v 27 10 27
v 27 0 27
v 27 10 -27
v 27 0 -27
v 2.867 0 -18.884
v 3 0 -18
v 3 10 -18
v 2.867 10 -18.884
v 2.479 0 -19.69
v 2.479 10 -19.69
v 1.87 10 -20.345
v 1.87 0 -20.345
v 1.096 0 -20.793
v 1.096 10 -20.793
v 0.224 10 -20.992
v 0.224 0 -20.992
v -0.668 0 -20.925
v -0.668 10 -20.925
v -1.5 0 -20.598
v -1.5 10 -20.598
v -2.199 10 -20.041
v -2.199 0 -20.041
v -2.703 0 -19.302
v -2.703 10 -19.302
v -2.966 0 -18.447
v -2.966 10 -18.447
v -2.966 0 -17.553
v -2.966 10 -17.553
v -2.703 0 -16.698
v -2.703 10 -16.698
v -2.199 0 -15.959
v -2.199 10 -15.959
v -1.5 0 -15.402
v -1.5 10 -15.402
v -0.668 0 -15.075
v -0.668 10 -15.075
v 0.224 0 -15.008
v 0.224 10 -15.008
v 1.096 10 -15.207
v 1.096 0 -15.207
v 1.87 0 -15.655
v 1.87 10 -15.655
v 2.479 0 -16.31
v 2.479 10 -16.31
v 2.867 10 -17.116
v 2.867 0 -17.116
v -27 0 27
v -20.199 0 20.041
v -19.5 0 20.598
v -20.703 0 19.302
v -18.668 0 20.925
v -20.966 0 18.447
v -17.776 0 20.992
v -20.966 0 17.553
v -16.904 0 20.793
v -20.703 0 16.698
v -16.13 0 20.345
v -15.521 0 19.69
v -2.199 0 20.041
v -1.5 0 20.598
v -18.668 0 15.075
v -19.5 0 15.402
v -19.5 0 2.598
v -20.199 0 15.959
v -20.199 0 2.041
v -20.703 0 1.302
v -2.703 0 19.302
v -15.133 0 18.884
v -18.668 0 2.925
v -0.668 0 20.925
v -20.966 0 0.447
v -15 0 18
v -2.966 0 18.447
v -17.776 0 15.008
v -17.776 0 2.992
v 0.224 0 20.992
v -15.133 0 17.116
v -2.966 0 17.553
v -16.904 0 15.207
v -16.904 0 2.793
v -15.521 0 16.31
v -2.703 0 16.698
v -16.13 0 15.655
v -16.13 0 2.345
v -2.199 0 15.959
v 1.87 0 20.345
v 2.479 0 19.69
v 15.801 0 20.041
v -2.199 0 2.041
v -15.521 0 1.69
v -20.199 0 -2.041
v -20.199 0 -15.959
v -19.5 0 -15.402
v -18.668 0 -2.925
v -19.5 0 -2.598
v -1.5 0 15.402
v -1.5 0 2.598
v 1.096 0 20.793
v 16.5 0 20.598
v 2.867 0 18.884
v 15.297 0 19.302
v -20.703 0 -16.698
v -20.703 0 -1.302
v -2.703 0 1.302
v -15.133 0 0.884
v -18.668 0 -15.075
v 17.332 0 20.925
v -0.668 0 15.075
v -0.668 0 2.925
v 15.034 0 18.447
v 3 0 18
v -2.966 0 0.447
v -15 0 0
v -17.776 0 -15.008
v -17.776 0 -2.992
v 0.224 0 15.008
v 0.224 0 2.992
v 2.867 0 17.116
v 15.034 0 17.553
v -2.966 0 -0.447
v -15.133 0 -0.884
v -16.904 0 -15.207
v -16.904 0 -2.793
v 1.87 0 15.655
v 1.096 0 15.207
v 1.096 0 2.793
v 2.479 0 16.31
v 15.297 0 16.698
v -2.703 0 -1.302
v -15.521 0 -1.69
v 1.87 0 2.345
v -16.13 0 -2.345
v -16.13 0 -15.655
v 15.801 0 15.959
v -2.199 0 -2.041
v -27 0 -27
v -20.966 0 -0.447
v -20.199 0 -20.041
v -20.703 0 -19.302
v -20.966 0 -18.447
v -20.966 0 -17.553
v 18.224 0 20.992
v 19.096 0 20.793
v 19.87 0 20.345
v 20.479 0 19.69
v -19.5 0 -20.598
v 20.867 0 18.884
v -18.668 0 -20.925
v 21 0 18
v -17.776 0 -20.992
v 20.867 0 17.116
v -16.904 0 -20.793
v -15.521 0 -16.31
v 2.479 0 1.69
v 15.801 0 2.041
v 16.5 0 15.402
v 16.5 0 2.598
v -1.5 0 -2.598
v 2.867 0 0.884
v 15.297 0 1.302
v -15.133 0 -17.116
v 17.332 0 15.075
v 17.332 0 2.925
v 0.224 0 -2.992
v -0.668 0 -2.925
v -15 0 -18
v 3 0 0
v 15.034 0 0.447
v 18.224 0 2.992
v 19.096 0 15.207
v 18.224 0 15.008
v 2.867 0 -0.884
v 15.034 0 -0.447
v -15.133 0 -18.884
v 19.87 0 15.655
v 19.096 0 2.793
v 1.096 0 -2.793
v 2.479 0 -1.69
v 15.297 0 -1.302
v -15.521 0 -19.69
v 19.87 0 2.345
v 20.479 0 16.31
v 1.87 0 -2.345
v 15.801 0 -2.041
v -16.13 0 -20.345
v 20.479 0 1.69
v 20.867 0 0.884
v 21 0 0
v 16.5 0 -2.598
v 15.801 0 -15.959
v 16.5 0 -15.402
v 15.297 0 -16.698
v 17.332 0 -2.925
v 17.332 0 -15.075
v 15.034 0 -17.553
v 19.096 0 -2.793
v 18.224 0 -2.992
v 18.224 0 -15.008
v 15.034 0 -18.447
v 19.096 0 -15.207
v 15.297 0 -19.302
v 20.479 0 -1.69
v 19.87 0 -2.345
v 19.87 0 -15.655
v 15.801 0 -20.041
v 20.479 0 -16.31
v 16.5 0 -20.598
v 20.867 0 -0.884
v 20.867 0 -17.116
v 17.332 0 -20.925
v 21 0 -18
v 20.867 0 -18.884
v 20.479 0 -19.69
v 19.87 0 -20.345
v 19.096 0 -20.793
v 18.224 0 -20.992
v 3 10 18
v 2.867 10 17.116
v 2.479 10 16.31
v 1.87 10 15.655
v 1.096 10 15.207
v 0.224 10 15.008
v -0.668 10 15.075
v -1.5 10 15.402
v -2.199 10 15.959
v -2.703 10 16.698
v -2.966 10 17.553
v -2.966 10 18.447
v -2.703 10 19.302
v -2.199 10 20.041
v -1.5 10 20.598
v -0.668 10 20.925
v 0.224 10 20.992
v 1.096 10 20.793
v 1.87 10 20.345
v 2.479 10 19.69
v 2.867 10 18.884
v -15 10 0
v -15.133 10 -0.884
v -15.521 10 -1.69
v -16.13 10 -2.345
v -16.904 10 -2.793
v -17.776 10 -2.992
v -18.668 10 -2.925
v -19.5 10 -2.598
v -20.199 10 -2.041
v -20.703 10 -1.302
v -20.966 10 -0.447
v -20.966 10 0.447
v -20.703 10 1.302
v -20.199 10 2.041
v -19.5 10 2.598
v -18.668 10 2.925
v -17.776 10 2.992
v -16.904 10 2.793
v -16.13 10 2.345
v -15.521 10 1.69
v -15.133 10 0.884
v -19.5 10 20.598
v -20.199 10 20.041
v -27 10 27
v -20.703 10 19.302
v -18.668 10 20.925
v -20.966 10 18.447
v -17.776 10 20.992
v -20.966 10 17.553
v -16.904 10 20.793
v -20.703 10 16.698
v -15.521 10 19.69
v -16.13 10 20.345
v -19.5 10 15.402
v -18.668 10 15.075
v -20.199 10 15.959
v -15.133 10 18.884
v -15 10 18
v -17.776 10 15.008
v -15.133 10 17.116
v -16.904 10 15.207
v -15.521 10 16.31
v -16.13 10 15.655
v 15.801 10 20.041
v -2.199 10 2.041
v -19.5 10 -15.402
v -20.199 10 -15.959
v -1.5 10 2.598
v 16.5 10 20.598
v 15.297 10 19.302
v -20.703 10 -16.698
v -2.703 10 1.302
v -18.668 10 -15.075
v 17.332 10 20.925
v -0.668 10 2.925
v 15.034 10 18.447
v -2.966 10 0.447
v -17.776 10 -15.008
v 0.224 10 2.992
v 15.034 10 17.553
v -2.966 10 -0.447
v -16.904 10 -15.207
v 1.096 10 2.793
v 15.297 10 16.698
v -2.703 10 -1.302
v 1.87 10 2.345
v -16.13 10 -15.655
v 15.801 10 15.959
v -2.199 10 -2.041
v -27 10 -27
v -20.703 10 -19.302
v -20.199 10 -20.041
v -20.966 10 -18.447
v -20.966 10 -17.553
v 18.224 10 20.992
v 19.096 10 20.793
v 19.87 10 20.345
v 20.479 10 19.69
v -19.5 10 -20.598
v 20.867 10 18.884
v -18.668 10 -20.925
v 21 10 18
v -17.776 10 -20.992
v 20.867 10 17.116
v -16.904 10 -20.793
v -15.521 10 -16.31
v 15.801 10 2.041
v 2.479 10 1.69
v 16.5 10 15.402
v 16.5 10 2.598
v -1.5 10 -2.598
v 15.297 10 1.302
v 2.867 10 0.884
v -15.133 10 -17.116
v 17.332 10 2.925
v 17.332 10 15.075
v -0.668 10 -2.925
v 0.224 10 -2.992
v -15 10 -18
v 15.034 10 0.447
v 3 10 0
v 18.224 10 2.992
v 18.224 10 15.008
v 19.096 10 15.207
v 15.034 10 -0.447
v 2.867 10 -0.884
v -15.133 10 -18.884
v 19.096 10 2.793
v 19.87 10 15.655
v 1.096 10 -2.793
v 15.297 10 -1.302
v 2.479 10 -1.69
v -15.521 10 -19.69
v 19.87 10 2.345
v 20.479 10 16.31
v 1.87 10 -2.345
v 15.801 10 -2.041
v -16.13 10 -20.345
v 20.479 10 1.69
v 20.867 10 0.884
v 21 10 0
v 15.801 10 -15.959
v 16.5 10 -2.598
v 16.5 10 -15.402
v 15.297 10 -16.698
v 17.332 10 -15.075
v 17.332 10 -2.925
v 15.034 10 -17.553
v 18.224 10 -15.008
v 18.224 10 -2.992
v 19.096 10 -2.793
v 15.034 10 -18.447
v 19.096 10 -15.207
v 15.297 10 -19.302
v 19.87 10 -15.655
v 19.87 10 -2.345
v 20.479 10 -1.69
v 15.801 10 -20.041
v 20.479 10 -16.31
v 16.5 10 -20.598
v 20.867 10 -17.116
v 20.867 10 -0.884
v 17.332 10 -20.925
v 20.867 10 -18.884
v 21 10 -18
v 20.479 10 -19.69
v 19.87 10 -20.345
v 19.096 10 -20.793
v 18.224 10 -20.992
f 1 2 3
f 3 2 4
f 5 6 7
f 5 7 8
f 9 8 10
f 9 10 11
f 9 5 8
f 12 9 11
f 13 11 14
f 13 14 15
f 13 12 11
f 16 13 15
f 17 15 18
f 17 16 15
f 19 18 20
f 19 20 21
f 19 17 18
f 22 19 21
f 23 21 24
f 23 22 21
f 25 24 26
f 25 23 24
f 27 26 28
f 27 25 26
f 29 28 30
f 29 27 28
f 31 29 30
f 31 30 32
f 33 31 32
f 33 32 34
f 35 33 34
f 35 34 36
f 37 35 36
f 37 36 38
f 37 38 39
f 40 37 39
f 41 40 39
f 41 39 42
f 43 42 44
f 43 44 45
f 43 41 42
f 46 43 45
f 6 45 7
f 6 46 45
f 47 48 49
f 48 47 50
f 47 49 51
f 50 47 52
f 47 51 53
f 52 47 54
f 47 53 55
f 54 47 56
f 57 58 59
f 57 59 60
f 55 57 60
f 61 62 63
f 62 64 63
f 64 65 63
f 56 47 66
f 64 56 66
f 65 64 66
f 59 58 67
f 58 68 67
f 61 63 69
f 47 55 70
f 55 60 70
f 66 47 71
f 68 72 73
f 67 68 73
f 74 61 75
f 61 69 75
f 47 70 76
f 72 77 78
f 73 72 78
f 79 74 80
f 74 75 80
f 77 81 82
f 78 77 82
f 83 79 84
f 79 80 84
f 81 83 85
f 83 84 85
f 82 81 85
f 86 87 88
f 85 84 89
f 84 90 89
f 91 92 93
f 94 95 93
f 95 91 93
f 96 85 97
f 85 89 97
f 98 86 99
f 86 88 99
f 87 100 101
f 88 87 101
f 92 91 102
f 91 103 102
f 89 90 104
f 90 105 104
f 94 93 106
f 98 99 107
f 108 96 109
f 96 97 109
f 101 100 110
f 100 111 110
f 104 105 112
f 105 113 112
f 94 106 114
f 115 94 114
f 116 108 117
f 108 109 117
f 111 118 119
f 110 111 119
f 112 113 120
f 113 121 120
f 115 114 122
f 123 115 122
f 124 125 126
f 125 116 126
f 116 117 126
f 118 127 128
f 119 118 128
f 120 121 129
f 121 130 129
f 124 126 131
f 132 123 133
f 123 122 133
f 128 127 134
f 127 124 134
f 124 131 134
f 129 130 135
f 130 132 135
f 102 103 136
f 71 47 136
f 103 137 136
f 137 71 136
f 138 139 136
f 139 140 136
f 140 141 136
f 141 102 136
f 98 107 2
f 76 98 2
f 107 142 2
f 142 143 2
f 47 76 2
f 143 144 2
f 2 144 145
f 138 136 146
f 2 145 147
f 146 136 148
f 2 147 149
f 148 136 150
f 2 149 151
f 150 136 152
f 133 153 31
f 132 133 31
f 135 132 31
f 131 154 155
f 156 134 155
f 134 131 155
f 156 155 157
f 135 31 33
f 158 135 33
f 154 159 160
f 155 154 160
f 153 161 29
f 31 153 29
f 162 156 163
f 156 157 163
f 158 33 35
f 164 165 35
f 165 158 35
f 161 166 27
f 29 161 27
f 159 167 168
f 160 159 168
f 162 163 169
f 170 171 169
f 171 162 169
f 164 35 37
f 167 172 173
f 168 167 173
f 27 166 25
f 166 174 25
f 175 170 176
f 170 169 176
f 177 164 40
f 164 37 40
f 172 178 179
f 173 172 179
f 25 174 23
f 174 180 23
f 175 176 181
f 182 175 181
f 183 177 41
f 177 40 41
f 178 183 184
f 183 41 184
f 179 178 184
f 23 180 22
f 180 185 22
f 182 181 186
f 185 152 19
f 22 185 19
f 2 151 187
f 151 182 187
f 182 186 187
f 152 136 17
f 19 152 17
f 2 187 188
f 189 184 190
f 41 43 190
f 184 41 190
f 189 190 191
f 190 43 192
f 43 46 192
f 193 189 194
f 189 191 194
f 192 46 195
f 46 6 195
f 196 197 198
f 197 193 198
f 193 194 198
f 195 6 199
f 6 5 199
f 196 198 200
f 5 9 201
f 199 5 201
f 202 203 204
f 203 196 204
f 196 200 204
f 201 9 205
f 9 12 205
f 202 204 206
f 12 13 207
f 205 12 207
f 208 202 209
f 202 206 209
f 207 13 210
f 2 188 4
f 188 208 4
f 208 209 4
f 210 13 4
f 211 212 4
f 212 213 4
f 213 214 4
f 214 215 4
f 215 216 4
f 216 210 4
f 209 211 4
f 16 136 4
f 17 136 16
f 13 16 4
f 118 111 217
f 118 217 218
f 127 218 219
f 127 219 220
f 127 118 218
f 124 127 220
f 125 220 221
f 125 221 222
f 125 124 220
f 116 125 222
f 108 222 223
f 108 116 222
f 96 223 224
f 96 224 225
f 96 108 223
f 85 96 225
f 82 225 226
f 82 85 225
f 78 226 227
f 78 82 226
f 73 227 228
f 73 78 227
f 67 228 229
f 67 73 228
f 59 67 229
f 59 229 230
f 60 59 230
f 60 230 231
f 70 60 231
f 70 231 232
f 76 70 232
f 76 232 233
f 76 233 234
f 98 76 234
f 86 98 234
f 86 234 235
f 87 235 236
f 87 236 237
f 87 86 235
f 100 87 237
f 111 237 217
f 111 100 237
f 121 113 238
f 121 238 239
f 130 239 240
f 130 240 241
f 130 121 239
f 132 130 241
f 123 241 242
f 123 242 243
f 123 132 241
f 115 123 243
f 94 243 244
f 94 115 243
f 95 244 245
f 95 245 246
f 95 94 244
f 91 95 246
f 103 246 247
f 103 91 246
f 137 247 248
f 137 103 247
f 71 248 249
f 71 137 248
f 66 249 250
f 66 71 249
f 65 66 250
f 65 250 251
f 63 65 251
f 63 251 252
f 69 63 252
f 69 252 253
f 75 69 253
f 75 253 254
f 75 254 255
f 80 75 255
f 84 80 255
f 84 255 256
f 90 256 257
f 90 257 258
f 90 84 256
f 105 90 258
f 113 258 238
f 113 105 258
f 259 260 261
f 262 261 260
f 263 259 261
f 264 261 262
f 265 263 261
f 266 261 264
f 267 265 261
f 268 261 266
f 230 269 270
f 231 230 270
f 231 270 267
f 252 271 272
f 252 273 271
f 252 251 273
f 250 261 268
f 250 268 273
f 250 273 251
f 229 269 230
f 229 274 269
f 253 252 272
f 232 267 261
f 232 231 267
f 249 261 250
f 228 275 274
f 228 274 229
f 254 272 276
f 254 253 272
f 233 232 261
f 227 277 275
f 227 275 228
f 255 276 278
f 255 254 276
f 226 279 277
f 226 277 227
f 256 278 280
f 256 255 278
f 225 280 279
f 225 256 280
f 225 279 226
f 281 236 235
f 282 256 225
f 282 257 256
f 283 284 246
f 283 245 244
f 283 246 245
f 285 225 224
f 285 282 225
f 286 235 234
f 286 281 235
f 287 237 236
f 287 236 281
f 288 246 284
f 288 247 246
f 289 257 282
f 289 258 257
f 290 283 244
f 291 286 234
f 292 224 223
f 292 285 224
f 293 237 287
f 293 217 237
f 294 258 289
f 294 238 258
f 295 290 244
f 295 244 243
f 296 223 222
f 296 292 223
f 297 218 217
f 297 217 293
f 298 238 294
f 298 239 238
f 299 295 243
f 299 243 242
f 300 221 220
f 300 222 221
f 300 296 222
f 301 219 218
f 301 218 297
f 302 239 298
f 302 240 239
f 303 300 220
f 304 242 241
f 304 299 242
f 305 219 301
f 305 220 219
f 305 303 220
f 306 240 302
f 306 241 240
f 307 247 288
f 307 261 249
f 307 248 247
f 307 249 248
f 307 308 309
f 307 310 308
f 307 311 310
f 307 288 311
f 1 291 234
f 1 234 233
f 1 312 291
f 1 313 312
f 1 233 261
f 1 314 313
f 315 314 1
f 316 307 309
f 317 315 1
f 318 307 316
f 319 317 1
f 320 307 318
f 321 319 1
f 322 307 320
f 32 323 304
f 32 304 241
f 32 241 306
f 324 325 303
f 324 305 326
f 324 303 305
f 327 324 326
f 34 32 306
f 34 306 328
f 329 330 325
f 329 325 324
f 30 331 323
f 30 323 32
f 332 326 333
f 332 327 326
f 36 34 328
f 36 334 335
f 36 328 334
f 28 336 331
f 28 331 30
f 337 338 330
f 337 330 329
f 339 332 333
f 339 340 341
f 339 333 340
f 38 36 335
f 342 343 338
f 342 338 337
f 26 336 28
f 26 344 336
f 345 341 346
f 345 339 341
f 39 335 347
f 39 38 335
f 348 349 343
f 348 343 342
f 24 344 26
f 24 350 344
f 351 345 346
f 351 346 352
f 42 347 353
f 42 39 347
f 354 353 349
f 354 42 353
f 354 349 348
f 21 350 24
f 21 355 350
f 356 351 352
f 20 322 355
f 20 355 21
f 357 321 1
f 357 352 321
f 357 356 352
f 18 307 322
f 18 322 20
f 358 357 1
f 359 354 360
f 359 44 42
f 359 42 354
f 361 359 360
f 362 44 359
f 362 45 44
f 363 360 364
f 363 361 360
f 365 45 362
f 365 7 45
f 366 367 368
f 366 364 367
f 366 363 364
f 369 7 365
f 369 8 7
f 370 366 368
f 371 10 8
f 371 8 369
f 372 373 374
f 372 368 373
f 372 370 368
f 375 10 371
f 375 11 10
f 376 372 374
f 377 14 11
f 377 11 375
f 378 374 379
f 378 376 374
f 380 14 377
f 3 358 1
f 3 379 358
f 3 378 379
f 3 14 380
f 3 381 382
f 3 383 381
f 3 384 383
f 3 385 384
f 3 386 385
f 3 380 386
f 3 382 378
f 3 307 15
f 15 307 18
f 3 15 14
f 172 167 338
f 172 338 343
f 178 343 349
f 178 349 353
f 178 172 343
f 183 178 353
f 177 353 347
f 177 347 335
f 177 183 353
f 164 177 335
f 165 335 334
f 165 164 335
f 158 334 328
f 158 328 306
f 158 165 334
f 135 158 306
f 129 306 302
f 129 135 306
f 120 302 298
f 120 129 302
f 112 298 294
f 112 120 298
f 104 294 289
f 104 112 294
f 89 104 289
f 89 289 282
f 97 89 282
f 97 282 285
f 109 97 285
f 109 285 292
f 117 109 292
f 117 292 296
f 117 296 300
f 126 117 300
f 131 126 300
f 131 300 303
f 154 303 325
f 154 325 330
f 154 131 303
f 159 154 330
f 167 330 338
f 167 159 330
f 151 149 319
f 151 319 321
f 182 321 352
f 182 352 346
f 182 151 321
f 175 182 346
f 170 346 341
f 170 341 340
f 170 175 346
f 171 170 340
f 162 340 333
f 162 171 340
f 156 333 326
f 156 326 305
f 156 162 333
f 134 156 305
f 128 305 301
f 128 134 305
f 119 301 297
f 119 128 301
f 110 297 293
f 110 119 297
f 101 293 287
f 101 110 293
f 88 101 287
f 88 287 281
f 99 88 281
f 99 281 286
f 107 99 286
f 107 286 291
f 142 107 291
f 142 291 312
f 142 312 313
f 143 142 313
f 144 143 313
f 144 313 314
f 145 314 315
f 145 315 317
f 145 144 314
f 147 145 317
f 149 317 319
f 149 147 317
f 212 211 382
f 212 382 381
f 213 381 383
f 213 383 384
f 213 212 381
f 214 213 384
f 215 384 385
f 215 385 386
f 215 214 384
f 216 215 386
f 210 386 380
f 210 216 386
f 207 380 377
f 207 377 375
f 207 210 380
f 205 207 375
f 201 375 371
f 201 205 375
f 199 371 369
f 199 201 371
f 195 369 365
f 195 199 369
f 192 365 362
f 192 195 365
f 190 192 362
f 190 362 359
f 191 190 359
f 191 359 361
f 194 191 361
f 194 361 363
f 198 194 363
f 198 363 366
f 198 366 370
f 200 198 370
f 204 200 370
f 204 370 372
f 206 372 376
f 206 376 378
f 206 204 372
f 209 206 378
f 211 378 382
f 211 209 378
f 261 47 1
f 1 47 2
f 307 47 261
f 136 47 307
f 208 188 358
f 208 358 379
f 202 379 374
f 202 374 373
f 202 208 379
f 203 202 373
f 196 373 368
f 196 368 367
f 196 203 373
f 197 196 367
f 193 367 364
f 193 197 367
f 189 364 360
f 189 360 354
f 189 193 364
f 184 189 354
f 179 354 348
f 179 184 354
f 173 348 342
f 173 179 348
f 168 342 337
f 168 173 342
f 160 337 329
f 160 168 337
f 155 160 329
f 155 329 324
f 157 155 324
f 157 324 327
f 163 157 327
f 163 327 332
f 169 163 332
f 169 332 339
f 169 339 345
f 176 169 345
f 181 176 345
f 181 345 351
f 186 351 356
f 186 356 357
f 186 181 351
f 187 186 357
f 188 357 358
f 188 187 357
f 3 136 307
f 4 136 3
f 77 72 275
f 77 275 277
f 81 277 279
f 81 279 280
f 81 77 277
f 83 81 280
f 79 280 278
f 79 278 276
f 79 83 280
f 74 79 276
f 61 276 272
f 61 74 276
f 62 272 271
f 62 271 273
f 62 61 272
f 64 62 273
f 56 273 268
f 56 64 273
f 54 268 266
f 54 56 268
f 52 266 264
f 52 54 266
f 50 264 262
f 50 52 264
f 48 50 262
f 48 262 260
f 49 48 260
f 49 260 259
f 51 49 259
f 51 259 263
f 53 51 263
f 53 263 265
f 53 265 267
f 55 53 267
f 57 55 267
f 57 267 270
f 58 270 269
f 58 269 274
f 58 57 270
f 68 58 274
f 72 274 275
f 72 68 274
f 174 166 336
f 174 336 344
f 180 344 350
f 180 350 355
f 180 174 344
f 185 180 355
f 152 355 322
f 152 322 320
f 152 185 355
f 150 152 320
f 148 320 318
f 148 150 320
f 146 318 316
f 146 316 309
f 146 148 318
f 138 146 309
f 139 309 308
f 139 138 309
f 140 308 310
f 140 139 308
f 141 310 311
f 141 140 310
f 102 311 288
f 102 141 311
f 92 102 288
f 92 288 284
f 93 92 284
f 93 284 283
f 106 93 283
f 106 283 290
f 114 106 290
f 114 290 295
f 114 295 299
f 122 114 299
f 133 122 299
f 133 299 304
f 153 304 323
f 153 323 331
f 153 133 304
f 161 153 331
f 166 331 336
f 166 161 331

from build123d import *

# Parameters (mm, degrees)
SKETCH1_W           = 54
SKETCH1_H           = 54
SKETCH1_R           = 3
BOSS_EXTRUDE1_DEPTH = 10


with BuildPart() as part:
    # Sketch1 → Boss-Extrude1 (new body)
    with BuildSketch(Plane(origin=(0, 0, 0), x_dir=(1, 0, 0), z_dir=(0, 1, 0))):
        Rectangle(SKETCH1_W, SKETCH1_H)
        with Locations((-18, -18)):
            Circle(SKETCH1_R, mode=Mode.SUBTRACT)
        with Locations((0, -18)):
            Circle(SKETCH1_R, mode=Mode.SUBTRACT)
        with Locations((18, -18)):
            Circle(SKETCH1_R, mode=Mode.SUBTRACT)
        with Locations((18, 0)):
            Circle(SKETCH1_R, mode=Mode.SUBTRACT)
        with Locations((18, 18)):
            Circle(SKETCH1_R, mode=Mode.SUBTRACT)
        with Locations((0, 18)):
            Circle(SKETCH1_R, mode=Mode.SUBTRACT)
        with Locations((-18, 18)):
            Circle(SKETCH1_R, mode=Mode.SUBTRACT)
        with Locations((-18, 0)):
            Circle(SKETCH1_R, mode=Mode.SUBTRACT)
        Circle(SKETCH1_R, mode=Mode.SUBTRACT)
    extrude(amount=BOSS_EXTRUDE1_DEPTH)


solid = part.part
